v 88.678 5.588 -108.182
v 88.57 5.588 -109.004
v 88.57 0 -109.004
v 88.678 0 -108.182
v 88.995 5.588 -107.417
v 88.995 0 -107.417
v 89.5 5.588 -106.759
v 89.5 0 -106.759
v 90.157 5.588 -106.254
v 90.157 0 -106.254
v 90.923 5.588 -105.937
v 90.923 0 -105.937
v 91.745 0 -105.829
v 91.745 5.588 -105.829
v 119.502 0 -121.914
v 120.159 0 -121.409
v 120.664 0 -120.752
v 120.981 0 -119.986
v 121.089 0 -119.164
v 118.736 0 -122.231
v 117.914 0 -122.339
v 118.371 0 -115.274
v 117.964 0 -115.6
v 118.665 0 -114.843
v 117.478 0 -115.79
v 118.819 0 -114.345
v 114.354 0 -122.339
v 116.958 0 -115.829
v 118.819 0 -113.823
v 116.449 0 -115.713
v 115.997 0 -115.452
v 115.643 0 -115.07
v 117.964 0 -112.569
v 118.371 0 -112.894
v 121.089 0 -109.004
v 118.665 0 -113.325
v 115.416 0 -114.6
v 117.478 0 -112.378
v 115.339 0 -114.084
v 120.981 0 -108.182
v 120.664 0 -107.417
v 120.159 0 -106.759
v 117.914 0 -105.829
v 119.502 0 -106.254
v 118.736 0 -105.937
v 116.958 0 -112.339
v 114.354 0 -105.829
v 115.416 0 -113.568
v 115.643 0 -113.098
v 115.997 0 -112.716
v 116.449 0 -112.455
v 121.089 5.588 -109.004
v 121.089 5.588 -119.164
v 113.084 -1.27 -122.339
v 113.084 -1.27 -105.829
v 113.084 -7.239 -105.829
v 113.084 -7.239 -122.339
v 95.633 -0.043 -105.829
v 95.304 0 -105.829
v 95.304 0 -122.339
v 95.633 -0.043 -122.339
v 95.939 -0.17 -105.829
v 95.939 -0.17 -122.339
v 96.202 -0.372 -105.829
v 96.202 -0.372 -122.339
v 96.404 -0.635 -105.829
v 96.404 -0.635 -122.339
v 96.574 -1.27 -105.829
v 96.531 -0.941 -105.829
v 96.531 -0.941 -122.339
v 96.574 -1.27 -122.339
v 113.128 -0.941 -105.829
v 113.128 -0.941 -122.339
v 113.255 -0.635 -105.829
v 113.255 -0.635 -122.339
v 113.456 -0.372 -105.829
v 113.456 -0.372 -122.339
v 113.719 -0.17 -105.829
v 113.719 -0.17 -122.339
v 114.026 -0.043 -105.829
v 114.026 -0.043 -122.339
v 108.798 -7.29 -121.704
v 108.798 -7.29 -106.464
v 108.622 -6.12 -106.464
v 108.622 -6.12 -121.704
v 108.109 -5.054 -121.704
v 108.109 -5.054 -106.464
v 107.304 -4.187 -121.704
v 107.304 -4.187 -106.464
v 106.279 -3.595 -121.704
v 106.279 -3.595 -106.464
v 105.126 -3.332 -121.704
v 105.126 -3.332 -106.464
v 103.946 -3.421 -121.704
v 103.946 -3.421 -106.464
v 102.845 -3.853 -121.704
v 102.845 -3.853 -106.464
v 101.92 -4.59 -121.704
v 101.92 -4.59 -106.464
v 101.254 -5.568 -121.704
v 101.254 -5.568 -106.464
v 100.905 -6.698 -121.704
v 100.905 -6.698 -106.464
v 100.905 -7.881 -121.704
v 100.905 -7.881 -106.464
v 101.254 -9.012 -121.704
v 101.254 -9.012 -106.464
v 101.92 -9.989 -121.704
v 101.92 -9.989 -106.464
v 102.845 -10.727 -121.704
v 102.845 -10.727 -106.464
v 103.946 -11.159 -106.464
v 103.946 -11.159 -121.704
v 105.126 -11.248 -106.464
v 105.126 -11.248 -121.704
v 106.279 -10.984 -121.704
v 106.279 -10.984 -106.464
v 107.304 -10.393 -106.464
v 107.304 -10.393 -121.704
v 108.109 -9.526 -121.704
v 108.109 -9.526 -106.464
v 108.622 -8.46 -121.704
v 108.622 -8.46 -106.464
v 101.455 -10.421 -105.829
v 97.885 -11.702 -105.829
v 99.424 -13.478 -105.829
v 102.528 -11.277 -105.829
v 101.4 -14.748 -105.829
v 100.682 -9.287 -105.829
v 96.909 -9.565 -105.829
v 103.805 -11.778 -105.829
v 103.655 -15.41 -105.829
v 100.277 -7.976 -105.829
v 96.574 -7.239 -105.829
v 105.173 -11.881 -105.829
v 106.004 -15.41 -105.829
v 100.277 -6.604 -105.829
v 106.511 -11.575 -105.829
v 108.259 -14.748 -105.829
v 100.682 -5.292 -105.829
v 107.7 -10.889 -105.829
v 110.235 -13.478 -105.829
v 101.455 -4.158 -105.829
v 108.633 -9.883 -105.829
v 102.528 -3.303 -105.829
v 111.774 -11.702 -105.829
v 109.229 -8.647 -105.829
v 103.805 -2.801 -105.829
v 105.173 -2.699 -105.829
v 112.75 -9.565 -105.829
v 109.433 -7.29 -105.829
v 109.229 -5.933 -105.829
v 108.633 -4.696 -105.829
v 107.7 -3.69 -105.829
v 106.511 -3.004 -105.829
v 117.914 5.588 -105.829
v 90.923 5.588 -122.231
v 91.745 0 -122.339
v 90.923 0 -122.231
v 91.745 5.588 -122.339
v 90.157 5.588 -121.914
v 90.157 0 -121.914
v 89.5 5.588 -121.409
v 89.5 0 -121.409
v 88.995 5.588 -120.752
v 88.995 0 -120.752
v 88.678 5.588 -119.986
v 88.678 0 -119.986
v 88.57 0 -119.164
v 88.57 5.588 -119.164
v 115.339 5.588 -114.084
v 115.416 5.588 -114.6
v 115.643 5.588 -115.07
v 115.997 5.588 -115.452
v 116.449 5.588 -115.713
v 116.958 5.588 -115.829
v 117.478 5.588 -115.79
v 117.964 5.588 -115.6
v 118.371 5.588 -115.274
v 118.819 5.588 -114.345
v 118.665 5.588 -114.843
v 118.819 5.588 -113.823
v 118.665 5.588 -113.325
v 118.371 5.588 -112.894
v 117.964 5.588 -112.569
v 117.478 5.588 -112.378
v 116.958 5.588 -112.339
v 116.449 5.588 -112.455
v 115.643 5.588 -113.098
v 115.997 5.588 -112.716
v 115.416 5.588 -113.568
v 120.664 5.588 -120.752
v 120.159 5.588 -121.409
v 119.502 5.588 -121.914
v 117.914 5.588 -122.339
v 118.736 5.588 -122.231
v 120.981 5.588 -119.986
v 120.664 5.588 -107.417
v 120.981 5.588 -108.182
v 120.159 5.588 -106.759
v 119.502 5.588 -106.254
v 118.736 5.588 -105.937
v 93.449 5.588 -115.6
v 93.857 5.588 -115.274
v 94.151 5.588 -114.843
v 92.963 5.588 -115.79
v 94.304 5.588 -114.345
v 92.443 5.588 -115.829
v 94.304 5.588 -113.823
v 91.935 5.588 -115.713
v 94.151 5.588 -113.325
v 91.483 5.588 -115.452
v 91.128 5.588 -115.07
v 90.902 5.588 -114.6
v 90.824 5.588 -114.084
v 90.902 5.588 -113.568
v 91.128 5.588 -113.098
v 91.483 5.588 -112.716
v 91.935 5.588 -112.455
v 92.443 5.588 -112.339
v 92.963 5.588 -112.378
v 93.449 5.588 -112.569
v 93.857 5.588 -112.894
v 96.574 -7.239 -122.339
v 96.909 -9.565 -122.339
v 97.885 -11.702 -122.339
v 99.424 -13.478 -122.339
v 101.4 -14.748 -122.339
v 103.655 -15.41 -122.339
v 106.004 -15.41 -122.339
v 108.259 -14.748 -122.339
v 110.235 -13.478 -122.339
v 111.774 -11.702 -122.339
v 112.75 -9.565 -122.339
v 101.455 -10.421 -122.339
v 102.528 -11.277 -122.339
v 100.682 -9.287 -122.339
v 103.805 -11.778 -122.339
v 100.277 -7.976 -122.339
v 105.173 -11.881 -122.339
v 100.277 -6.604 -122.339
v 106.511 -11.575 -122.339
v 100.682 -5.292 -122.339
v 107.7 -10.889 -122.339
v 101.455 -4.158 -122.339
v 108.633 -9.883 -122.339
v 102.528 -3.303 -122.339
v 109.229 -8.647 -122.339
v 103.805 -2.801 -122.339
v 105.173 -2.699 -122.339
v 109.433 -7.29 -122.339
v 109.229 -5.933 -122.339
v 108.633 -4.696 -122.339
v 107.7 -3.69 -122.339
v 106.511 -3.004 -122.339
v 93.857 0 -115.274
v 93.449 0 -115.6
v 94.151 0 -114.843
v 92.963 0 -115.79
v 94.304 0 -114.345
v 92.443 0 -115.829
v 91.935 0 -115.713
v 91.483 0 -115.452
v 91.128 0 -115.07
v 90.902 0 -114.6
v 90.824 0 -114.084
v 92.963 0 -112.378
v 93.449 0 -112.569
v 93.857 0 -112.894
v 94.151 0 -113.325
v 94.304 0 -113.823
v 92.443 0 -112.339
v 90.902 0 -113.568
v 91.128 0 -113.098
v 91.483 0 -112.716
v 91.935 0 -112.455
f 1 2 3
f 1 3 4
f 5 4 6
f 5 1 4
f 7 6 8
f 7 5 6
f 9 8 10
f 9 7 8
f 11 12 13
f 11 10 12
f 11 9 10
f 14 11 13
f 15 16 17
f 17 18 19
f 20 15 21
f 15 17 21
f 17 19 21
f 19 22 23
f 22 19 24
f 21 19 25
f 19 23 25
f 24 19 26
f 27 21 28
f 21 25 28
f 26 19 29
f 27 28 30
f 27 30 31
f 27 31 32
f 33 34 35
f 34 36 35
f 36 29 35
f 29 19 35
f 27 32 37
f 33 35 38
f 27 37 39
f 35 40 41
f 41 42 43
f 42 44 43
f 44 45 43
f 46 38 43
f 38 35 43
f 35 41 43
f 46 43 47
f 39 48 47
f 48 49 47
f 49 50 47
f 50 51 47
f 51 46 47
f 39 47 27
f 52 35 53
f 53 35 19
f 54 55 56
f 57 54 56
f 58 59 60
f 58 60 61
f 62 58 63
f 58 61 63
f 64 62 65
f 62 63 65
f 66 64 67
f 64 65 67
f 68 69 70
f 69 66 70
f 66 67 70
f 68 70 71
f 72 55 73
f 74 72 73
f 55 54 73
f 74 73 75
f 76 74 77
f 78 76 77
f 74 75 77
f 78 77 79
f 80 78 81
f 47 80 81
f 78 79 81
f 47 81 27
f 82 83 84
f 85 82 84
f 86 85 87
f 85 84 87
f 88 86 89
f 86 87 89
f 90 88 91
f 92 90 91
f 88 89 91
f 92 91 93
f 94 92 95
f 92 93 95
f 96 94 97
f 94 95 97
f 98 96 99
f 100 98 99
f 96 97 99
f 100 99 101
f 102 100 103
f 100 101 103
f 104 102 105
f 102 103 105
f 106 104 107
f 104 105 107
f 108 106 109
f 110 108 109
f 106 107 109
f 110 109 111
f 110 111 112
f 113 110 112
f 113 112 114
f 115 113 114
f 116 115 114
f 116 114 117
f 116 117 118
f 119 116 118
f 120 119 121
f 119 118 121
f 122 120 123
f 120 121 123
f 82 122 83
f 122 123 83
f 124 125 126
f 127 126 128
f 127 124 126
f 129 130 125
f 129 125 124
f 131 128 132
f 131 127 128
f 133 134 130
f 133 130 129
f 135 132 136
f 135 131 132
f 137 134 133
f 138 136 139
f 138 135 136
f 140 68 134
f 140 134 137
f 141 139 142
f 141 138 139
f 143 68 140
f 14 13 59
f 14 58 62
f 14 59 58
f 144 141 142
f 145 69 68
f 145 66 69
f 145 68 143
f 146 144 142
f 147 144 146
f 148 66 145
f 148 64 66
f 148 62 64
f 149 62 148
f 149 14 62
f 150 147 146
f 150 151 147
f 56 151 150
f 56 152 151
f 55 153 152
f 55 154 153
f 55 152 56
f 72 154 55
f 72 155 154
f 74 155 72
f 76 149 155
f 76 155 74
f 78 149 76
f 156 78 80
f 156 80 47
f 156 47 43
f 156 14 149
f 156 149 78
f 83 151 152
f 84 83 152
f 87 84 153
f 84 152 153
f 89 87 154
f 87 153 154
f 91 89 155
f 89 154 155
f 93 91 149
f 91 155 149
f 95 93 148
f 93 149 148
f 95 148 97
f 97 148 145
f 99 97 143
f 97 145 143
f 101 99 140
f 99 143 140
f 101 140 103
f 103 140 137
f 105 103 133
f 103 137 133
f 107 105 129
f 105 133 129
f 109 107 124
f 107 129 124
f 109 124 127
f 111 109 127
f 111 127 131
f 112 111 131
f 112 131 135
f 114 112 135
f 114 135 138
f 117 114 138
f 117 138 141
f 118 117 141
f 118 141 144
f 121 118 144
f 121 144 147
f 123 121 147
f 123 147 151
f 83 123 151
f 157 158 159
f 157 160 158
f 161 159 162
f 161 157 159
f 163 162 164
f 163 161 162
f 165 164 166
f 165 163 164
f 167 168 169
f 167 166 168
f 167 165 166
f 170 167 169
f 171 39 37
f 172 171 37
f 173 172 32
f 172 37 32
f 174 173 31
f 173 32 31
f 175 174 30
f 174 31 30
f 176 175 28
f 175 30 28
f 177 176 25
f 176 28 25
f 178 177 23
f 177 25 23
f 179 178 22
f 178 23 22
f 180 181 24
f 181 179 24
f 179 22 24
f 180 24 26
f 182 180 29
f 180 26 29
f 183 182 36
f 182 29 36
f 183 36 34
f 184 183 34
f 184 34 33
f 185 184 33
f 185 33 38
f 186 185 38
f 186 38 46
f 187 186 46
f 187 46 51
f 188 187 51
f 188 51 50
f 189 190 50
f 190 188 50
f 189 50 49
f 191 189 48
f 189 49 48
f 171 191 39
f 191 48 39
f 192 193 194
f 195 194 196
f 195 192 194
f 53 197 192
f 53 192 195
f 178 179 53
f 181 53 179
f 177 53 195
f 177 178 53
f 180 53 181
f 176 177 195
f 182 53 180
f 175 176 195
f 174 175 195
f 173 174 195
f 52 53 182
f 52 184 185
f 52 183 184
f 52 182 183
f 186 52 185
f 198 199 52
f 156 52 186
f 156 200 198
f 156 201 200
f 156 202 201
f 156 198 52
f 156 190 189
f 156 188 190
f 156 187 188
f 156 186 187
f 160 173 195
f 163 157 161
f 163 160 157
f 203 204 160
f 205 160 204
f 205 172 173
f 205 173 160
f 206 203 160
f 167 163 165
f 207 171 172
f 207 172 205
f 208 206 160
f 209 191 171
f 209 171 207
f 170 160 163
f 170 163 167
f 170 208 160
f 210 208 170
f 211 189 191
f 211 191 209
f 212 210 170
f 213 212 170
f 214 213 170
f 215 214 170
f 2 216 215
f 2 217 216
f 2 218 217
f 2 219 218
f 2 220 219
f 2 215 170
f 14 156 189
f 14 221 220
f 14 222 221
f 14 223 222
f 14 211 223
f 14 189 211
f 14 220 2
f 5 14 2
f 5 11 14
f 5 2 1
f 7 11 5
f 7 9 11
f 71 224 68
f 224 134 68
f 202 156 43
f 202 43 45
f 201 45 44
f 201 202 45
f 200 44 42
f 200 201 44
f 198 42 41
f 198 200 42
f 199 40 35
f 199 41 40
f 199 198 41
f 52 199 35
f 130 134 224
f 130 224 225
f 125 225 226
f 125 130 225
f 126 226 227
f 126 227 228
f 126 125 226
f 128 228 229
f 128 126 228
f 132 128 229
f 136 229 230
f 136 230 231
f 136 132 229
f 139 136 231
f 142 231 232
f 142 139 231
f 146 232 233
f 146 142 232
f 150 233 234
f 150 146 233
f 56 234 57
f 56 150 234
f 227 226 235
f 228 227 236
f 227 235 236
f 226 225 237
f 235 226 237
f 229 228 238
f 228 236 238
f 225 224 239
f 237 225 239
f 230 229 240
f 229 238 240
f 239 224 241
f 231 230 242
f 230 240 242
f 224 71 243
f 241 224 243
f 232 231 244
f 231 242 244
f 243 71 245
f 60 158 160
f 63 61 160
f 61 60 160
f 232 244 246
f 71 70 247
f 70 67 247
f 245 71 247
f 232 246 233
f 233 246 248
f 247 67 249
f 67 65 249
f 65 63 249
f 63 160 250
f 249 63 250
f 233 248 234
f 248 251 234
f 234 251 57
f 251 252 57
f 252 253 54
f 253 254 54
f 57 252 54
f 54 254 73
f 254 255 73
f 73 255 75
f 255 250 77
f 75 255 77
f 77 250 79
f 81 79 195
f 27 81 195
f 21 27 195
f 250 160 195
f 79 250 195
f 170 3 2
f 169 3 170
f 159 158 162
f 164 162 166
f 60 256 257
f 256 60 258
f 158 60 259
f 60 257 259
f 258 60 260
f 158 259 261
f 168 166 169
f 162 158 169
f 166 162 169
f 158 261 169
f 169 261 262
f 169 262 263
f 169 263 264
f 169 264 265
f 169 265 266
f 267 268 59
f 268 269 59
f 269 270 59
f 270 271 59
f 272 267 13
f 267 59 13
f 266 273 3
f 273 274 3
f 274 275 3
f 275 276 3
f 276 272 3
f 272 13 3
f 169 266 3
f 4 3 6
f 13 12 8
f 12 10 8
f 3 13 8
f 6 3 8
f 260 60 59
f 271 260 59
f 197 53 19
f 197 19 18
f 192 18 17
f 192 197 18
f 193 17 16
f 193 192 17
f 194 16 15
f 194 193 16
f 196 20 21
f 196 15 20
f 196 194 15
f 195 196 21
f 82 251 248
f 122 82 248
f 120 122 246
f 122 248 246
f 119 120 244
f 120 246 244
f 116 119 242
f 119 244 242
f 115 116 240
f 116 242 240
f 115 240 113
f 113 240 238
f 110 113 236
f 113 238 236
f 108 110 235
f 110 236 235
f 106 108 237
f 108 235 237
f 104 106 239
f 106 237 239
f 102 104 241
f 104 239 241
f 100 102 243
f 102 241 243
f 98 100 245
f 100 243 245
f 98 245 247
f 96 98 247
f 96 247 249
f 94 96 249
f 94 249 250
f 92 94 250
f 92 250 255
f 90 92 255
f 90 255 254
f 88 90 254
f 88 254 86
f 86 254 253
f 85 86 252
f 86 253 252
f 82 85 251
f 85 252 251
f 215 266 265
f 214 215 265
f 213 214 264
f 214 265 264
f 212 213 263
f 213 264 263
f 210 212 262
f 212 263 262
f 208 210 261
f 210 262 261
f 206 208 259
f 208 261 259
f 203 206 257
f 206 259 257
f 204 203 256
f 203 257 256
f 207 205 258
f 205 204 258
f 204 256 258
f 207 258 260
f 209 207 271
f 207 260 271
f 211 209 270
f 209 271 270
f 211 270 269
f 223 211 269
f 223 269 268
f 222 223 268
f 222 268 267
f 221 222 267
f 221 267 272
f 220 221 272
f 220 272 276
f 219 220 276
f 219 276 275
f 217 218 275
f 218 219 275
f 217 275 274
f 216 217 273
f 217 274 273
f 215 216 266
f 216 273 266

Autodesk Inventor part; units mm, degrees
ref_plane "YZ Plane" through (0, 0, 0) normal (1, 0, 0) x (0, 1, 0)
ref_plane "XZ Plane" through (0, 0, 0) normal (0, 1, 0) x (-1, 0, 0)
ref_plane "XY Plane" through (0, 0, 0) normal (0, 0, 1) x (1, 0, 0)
sketch "Sketch1" plane through (0, 0, 0) normal (0, 1, 0) x (-1, 0, 0)
  circle A0 centre (-92.5739, -114.0841) radius 1.75
  line L0 (-104.8331, -105.8291) -> (-88.5698, -105.8291)
  line L1 (-88.5698, -105.8291) -> (-88.5698, -122.3391)
  line L2 (-88.5698, -122.3391) -> (-104.8331, -122.3391)
  line L3 (-104.8331, -105.8291) -> (-121.0891, -105.8291)
  line L4 (-121.0891, -105.8291) -> (-121.0891, -122.3391)
  line L5 (-121.0891, -122.3391) -> (-104.8331, -122.3391)
  circle A1 centre (-117.0886, -114.0841) radius 1.75
  point P0 (0, 0)
  point P1 (0, 0)
extrude "Extrusion1" add sketch "Sketch1" along normal blind 5.588
sketch "Sketch2" plane through (88.5698, 0, -105.8291) normal (0, 0, 1) x (1, 0, 0)
  line L0 (0, 5.588) -> (32.5193, 5.588) projected
  line L1 (0, 5.588) -> (32.5193, 5.588)
  arc A0 (8.0046, -7.239) -> (24.5146, -7.239) centre (16.2596, -7.239) ccw
  line L2 (8.0046, -7.239) -> (8.0046, 0)
  line L3 (0, 0) -> (32.5193, 0) projected
  line L4 (8.0046, 0) -> (24.5146, 0)
  line L5 (24.5146, 0) -> (24.5146, -7.239)
  circle A1 centre (16.2596, -7.2898) radius 3.9688
  point P0 (-88.5698, 0)
  dimension "d14" = 7.9375
fillet "Fillet2" radius 3.175 4 edges at (88.5698, 2.794, -122.3391) (88.5698, 2.794, -105.8291) (121.0891, 2.794, -122.3391) (121.0891, 2.794, -105.8291)
extrude "Extrusion3" add sketch "Sketch2" against normal blind 16.51
fillet "Fillet3" radius 1.27 2 edges at (96.5744, 0, -114.0841) (113.0844, 0, -114.0841)
chamfer "Chamfer2" distance 0.635 angle 45 2 edges at (100.8607, -7.2898, -105.8291) (100.8607, -7.2898, -122.3391)
properties part number "shaftMount"
